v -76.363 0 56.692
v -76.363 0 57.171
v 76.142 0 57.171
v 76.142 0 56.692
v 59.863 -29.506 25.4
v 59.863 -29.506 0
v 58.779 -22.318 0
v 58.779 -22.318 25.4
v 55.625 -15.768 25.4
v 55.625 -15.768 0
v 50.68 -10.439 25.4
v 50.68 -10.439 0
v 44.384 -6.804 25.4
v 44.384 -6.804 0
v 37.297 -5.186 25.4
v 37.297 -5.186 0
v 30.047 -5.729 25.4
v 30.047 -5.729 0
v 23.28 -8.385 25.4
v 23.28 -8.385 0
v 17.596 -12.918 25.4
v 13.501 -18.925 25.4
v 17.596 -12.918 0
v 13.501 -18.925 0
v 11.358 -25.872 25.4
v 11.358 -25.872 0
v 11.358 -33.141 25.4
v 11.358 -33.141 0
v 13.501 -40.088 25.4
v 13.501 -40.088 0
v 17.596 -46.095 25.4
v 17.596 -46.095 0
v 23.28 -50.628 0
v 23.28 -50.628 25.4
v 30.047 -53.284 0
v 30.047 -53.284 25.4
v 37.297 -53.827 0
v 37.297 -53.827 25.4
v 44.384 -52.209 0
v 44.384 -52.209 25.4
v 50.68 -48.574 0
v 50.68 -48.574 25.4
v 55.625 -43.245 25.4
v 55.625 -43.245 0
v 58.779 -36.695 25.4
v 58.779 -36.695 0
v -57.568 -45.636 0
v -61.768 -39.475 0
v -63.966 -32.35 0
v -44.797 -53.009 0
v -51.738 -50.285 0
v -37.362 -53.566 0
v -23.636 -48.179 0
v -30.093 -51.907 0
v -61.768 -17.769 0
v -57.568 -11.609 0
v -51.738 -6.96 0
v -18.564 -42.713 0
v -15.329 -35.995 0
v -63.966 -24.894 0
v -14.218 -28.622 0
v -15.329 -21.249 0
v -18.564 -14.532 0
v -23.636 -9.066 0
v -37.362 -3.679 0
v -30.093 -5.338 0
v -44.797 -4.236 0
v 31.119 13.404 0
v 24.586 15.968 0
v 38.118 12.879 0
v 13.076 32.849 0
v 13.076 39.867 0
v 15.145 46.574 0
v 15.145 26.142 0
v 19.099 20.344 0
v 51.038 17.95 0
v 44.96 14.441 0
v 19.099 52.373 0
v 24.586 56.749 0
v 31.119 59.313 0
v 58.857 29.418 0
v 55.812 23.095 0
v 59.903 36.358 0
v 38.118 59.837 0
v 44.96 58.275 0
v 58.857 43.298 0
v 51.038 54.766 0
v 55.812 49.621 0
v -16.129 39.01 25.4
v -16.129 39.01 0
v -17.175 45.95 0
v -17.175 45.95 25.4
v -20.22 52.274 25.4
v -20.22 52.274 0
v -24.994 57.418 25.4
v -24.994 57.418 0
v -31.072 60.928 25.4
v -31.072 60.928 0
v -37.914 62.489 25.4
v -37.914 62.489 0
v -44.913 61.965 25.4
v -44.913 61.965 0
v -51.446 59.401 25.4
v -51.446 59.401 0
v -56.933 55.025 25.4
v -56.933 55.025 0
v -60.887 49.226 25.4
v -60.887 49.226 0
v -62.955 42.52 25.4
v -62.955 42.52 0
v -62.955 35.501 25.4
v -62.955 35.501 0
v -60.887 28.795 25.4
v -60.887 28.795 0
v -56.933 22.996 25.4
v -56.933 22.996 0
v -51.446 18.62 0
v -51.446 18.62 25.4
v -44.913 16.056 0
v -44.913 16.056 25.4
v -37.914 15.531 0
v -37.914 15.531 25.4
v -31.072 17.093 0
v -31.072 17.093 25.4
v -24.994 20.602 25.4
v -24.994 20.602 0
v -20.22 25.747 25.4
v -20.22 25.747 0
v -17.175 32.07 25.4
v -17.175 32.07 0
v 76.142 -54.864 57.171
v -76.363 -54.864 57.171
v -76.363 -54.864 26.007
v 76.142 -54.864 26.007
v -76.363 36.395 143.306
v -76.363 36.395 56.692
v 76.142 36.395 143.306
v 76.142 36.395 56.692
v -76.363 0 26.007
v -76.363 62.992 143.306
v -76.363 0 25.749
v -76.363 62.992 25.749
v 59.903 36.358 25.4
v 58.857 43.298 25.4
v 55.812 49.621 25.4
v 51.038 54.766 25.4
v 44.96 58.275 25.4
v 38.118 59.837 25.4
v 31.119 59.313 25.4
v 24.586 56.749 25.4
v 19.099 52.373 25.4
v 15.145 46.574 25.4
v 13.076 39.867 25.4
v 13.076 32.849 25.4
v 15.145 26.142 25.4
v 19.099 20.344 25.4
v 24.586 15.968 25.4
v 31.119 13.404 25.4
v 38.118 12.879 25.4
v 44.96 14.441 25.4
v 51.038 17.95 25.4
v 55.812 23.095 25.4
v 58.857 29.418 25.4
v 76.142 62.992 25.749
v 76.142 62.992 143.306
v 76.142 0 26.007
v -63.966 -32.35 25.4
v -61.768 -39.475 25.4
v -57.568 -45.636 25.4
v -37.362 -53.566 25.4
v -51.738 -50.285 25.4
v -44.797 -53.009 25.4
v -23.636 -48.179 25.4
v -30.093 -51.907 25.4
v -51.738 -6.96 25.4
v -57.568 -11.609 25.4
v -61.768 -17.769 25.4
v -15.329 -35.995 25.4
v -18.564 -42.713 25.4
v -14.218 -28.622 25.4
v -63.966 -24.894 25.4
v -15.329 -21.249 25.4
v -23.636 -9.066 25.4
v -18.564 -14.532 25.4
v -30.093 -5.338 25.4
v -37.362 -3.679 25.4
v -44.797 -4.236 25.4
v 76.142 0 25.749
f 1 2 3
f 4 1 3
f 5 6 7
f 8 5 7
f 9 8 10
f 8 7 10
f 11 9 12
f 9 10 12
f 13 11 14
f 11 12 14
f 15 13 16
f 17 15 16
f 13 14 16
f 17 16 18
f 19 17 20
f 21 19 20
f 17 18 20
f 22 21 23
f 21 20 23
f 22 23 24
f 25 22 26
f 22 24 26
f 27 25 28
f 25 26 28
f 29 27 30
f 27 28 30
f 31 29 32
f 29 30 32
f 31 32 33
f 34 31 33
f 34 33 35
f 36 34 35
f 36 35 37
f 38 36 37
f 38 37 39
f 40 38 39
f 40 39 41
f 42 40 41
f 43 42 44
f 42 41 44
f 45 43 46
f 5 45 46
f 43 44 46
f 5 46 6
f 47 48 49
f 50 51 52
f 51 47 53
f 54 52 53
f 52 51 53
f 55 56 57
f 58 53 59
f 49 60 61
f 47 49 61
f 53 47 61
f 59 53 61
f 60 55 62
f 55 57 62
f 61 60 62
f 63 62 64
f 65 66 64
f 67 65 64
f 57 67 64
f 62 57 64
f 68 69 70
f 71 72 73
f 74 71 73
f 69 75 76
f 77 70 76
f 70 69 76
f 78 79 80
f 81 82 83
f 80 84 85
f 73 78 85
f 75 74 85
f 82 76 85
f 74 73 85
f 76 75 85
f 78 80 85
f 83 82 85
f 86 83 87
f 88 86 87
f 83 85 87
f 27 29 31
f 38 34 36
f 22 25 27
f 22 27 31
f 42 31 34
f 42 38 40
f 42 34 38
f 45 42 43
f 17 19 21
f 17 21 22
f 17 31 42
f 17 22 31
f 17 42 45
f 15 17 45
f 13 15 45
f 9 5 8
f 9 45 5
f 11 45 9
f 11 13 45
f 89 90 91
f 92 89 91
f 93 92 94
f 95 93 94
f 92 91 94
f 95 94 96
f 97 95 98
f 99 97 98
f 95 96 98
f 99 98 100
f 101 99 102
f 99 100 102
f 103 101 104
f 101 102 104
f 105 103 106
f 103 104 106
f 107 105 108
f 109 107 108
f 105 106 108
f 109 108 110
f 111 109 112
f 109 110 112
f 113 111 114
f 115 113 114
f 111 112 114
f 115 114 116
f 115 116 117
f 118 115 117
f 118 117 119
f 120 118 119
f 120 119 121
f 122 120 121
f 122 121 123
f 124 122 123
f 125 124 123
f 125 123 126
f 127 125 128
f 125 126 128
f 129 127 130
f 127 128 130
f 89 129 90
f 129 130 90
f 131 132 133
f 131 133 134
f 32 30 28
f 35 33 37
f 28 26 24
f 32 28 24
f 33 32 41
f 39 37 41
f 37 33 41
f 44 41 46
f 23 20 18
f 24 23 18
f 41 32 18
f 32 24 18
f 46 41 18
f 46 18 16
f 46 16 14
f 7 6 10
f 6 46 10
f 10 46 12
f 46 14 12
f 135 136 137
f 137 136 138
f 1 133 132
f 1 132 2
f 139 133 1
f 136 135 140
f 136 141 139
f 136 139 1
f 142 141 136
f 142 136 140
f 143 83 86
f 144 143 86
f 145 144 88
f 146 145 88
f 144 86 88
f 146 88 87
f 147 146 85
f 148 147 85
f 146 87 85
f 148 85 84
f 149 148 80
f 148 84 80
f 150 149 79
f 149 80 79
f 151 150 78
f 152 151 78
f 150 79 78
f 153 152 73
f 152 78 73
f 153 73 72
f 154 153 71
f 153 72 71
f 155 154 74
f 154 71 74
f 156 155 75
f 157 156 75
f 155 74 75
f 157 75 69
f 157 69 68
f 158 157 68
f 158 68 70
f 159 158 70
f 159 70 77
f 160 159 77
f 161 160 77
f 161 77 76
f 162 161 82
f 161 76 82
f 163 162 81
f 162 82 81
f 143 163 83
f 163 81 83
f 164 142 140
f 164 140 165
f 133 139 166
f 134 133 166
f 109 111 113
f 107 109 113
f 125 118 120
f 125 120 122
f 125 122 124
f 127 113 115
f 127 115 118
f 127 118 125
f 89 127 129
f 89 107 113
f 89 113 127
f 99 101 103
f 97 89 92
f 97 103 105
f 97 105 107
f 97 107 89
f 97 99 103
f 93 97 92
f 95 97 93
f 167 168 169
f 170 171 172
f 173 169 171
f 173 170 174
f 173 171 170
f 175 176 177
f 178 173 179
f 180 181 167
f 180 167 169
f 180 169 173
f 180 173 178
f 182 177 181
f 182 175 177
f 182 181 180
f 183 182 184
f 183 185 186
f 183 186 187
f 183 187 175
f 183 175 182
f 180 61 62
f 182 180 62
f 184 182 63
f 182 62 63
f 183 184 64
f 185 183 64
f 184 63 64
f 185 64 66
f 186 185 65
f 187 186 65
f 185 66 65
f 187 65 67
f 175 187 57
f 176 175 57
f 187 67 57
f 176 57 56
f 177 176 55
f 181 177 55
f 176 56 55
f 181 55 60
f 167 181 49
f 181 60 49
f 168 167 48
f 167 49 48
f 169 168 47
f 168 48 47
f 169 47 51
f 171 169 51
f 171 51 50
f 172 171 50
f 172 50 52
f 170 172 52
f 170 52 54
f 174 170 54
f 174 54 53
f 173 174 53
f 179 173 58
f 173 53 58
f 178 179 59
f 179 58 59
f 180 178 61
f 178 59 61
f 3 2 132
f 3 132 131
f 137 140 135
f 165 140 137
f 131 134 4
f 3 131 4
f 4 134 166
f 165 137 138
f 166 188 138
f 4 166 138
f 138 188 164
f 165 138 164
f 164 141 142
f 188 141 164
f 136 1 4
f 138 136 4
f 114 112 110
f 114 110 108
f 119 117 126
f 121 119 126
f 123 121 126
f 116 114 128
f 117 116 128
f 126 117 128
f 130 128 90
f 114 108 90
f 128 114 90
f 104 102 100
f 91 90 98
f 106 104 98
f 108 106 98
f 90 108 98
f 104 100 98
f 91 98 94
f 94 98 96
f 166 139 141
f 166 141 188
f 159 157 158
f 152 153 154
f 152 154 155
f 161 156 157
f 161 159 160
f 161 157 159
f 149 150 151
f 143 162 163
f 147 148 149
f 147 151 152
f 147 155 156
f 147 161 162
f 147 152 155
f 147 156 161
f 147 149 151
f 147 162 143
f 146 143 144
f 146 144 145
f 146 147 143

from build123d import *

# Parameters (mm, degrees)
F0_R     = 23.544816
F0_R_2   = 23.544819
F0_R_3   = 25.013609
F0_R_4   = 24.388662
F1_DEPTH = 25.4
F2_W     = 152.505256
F2_H     = 30.943092
F3_DEPTH = 62.992
F4_W     = 152.505256
F4_H     = 31.164114
F5_DEPTH = 54.864
F6_W     = 152.505256
F6_H     = 26.597274
F7_DEPTH = 86.614


with BuildPart() as f1:
    # F0 (on Top) → F1 (new body)
    with BuildSketch(Plane.XY):
        with Locations((-39.673466, 39.010402)):
            Circle(F0_R)
        with Locations((36.358133, 36.358137)):
            Circle(F0_R_2)
        with Locations((-39.231423, -28.622361)):
            Circle(F0_R_3)
        with Locations((35.474047, -29.506449)):
            Circle(F0_R_4)
    extrude(amount=F1_DEPTH)


with BuildPart() as f3:
    # F2 (on Front) → F3 (new body)
    with BuildSketch(Plane.XZ):
        with Locations((-0.110511, 41.220622)):
            Rectangle(F2_W, F2_H)
    extrude(amount=-F3_DEPTH)

    # F4 (on Front) → F5 (join)
    with BuildSketch(Plane.XZ):
        with Locations((-0.110511, 41.588744)):
            Rectangle(F4_W, F4_H)
    extrude(amount=F5_DEPTH)

    # F6 (on face) → F7 (join)
    with BuildSketch(Plane.XY.offset(56.692168)):
        with Locations((-0.110511, 49.693363)):
            Rectangle(F6_W, F6_H)
    extrude(amount=F7_DEPTH)


solid = Compound([f1.part, f3.part])
